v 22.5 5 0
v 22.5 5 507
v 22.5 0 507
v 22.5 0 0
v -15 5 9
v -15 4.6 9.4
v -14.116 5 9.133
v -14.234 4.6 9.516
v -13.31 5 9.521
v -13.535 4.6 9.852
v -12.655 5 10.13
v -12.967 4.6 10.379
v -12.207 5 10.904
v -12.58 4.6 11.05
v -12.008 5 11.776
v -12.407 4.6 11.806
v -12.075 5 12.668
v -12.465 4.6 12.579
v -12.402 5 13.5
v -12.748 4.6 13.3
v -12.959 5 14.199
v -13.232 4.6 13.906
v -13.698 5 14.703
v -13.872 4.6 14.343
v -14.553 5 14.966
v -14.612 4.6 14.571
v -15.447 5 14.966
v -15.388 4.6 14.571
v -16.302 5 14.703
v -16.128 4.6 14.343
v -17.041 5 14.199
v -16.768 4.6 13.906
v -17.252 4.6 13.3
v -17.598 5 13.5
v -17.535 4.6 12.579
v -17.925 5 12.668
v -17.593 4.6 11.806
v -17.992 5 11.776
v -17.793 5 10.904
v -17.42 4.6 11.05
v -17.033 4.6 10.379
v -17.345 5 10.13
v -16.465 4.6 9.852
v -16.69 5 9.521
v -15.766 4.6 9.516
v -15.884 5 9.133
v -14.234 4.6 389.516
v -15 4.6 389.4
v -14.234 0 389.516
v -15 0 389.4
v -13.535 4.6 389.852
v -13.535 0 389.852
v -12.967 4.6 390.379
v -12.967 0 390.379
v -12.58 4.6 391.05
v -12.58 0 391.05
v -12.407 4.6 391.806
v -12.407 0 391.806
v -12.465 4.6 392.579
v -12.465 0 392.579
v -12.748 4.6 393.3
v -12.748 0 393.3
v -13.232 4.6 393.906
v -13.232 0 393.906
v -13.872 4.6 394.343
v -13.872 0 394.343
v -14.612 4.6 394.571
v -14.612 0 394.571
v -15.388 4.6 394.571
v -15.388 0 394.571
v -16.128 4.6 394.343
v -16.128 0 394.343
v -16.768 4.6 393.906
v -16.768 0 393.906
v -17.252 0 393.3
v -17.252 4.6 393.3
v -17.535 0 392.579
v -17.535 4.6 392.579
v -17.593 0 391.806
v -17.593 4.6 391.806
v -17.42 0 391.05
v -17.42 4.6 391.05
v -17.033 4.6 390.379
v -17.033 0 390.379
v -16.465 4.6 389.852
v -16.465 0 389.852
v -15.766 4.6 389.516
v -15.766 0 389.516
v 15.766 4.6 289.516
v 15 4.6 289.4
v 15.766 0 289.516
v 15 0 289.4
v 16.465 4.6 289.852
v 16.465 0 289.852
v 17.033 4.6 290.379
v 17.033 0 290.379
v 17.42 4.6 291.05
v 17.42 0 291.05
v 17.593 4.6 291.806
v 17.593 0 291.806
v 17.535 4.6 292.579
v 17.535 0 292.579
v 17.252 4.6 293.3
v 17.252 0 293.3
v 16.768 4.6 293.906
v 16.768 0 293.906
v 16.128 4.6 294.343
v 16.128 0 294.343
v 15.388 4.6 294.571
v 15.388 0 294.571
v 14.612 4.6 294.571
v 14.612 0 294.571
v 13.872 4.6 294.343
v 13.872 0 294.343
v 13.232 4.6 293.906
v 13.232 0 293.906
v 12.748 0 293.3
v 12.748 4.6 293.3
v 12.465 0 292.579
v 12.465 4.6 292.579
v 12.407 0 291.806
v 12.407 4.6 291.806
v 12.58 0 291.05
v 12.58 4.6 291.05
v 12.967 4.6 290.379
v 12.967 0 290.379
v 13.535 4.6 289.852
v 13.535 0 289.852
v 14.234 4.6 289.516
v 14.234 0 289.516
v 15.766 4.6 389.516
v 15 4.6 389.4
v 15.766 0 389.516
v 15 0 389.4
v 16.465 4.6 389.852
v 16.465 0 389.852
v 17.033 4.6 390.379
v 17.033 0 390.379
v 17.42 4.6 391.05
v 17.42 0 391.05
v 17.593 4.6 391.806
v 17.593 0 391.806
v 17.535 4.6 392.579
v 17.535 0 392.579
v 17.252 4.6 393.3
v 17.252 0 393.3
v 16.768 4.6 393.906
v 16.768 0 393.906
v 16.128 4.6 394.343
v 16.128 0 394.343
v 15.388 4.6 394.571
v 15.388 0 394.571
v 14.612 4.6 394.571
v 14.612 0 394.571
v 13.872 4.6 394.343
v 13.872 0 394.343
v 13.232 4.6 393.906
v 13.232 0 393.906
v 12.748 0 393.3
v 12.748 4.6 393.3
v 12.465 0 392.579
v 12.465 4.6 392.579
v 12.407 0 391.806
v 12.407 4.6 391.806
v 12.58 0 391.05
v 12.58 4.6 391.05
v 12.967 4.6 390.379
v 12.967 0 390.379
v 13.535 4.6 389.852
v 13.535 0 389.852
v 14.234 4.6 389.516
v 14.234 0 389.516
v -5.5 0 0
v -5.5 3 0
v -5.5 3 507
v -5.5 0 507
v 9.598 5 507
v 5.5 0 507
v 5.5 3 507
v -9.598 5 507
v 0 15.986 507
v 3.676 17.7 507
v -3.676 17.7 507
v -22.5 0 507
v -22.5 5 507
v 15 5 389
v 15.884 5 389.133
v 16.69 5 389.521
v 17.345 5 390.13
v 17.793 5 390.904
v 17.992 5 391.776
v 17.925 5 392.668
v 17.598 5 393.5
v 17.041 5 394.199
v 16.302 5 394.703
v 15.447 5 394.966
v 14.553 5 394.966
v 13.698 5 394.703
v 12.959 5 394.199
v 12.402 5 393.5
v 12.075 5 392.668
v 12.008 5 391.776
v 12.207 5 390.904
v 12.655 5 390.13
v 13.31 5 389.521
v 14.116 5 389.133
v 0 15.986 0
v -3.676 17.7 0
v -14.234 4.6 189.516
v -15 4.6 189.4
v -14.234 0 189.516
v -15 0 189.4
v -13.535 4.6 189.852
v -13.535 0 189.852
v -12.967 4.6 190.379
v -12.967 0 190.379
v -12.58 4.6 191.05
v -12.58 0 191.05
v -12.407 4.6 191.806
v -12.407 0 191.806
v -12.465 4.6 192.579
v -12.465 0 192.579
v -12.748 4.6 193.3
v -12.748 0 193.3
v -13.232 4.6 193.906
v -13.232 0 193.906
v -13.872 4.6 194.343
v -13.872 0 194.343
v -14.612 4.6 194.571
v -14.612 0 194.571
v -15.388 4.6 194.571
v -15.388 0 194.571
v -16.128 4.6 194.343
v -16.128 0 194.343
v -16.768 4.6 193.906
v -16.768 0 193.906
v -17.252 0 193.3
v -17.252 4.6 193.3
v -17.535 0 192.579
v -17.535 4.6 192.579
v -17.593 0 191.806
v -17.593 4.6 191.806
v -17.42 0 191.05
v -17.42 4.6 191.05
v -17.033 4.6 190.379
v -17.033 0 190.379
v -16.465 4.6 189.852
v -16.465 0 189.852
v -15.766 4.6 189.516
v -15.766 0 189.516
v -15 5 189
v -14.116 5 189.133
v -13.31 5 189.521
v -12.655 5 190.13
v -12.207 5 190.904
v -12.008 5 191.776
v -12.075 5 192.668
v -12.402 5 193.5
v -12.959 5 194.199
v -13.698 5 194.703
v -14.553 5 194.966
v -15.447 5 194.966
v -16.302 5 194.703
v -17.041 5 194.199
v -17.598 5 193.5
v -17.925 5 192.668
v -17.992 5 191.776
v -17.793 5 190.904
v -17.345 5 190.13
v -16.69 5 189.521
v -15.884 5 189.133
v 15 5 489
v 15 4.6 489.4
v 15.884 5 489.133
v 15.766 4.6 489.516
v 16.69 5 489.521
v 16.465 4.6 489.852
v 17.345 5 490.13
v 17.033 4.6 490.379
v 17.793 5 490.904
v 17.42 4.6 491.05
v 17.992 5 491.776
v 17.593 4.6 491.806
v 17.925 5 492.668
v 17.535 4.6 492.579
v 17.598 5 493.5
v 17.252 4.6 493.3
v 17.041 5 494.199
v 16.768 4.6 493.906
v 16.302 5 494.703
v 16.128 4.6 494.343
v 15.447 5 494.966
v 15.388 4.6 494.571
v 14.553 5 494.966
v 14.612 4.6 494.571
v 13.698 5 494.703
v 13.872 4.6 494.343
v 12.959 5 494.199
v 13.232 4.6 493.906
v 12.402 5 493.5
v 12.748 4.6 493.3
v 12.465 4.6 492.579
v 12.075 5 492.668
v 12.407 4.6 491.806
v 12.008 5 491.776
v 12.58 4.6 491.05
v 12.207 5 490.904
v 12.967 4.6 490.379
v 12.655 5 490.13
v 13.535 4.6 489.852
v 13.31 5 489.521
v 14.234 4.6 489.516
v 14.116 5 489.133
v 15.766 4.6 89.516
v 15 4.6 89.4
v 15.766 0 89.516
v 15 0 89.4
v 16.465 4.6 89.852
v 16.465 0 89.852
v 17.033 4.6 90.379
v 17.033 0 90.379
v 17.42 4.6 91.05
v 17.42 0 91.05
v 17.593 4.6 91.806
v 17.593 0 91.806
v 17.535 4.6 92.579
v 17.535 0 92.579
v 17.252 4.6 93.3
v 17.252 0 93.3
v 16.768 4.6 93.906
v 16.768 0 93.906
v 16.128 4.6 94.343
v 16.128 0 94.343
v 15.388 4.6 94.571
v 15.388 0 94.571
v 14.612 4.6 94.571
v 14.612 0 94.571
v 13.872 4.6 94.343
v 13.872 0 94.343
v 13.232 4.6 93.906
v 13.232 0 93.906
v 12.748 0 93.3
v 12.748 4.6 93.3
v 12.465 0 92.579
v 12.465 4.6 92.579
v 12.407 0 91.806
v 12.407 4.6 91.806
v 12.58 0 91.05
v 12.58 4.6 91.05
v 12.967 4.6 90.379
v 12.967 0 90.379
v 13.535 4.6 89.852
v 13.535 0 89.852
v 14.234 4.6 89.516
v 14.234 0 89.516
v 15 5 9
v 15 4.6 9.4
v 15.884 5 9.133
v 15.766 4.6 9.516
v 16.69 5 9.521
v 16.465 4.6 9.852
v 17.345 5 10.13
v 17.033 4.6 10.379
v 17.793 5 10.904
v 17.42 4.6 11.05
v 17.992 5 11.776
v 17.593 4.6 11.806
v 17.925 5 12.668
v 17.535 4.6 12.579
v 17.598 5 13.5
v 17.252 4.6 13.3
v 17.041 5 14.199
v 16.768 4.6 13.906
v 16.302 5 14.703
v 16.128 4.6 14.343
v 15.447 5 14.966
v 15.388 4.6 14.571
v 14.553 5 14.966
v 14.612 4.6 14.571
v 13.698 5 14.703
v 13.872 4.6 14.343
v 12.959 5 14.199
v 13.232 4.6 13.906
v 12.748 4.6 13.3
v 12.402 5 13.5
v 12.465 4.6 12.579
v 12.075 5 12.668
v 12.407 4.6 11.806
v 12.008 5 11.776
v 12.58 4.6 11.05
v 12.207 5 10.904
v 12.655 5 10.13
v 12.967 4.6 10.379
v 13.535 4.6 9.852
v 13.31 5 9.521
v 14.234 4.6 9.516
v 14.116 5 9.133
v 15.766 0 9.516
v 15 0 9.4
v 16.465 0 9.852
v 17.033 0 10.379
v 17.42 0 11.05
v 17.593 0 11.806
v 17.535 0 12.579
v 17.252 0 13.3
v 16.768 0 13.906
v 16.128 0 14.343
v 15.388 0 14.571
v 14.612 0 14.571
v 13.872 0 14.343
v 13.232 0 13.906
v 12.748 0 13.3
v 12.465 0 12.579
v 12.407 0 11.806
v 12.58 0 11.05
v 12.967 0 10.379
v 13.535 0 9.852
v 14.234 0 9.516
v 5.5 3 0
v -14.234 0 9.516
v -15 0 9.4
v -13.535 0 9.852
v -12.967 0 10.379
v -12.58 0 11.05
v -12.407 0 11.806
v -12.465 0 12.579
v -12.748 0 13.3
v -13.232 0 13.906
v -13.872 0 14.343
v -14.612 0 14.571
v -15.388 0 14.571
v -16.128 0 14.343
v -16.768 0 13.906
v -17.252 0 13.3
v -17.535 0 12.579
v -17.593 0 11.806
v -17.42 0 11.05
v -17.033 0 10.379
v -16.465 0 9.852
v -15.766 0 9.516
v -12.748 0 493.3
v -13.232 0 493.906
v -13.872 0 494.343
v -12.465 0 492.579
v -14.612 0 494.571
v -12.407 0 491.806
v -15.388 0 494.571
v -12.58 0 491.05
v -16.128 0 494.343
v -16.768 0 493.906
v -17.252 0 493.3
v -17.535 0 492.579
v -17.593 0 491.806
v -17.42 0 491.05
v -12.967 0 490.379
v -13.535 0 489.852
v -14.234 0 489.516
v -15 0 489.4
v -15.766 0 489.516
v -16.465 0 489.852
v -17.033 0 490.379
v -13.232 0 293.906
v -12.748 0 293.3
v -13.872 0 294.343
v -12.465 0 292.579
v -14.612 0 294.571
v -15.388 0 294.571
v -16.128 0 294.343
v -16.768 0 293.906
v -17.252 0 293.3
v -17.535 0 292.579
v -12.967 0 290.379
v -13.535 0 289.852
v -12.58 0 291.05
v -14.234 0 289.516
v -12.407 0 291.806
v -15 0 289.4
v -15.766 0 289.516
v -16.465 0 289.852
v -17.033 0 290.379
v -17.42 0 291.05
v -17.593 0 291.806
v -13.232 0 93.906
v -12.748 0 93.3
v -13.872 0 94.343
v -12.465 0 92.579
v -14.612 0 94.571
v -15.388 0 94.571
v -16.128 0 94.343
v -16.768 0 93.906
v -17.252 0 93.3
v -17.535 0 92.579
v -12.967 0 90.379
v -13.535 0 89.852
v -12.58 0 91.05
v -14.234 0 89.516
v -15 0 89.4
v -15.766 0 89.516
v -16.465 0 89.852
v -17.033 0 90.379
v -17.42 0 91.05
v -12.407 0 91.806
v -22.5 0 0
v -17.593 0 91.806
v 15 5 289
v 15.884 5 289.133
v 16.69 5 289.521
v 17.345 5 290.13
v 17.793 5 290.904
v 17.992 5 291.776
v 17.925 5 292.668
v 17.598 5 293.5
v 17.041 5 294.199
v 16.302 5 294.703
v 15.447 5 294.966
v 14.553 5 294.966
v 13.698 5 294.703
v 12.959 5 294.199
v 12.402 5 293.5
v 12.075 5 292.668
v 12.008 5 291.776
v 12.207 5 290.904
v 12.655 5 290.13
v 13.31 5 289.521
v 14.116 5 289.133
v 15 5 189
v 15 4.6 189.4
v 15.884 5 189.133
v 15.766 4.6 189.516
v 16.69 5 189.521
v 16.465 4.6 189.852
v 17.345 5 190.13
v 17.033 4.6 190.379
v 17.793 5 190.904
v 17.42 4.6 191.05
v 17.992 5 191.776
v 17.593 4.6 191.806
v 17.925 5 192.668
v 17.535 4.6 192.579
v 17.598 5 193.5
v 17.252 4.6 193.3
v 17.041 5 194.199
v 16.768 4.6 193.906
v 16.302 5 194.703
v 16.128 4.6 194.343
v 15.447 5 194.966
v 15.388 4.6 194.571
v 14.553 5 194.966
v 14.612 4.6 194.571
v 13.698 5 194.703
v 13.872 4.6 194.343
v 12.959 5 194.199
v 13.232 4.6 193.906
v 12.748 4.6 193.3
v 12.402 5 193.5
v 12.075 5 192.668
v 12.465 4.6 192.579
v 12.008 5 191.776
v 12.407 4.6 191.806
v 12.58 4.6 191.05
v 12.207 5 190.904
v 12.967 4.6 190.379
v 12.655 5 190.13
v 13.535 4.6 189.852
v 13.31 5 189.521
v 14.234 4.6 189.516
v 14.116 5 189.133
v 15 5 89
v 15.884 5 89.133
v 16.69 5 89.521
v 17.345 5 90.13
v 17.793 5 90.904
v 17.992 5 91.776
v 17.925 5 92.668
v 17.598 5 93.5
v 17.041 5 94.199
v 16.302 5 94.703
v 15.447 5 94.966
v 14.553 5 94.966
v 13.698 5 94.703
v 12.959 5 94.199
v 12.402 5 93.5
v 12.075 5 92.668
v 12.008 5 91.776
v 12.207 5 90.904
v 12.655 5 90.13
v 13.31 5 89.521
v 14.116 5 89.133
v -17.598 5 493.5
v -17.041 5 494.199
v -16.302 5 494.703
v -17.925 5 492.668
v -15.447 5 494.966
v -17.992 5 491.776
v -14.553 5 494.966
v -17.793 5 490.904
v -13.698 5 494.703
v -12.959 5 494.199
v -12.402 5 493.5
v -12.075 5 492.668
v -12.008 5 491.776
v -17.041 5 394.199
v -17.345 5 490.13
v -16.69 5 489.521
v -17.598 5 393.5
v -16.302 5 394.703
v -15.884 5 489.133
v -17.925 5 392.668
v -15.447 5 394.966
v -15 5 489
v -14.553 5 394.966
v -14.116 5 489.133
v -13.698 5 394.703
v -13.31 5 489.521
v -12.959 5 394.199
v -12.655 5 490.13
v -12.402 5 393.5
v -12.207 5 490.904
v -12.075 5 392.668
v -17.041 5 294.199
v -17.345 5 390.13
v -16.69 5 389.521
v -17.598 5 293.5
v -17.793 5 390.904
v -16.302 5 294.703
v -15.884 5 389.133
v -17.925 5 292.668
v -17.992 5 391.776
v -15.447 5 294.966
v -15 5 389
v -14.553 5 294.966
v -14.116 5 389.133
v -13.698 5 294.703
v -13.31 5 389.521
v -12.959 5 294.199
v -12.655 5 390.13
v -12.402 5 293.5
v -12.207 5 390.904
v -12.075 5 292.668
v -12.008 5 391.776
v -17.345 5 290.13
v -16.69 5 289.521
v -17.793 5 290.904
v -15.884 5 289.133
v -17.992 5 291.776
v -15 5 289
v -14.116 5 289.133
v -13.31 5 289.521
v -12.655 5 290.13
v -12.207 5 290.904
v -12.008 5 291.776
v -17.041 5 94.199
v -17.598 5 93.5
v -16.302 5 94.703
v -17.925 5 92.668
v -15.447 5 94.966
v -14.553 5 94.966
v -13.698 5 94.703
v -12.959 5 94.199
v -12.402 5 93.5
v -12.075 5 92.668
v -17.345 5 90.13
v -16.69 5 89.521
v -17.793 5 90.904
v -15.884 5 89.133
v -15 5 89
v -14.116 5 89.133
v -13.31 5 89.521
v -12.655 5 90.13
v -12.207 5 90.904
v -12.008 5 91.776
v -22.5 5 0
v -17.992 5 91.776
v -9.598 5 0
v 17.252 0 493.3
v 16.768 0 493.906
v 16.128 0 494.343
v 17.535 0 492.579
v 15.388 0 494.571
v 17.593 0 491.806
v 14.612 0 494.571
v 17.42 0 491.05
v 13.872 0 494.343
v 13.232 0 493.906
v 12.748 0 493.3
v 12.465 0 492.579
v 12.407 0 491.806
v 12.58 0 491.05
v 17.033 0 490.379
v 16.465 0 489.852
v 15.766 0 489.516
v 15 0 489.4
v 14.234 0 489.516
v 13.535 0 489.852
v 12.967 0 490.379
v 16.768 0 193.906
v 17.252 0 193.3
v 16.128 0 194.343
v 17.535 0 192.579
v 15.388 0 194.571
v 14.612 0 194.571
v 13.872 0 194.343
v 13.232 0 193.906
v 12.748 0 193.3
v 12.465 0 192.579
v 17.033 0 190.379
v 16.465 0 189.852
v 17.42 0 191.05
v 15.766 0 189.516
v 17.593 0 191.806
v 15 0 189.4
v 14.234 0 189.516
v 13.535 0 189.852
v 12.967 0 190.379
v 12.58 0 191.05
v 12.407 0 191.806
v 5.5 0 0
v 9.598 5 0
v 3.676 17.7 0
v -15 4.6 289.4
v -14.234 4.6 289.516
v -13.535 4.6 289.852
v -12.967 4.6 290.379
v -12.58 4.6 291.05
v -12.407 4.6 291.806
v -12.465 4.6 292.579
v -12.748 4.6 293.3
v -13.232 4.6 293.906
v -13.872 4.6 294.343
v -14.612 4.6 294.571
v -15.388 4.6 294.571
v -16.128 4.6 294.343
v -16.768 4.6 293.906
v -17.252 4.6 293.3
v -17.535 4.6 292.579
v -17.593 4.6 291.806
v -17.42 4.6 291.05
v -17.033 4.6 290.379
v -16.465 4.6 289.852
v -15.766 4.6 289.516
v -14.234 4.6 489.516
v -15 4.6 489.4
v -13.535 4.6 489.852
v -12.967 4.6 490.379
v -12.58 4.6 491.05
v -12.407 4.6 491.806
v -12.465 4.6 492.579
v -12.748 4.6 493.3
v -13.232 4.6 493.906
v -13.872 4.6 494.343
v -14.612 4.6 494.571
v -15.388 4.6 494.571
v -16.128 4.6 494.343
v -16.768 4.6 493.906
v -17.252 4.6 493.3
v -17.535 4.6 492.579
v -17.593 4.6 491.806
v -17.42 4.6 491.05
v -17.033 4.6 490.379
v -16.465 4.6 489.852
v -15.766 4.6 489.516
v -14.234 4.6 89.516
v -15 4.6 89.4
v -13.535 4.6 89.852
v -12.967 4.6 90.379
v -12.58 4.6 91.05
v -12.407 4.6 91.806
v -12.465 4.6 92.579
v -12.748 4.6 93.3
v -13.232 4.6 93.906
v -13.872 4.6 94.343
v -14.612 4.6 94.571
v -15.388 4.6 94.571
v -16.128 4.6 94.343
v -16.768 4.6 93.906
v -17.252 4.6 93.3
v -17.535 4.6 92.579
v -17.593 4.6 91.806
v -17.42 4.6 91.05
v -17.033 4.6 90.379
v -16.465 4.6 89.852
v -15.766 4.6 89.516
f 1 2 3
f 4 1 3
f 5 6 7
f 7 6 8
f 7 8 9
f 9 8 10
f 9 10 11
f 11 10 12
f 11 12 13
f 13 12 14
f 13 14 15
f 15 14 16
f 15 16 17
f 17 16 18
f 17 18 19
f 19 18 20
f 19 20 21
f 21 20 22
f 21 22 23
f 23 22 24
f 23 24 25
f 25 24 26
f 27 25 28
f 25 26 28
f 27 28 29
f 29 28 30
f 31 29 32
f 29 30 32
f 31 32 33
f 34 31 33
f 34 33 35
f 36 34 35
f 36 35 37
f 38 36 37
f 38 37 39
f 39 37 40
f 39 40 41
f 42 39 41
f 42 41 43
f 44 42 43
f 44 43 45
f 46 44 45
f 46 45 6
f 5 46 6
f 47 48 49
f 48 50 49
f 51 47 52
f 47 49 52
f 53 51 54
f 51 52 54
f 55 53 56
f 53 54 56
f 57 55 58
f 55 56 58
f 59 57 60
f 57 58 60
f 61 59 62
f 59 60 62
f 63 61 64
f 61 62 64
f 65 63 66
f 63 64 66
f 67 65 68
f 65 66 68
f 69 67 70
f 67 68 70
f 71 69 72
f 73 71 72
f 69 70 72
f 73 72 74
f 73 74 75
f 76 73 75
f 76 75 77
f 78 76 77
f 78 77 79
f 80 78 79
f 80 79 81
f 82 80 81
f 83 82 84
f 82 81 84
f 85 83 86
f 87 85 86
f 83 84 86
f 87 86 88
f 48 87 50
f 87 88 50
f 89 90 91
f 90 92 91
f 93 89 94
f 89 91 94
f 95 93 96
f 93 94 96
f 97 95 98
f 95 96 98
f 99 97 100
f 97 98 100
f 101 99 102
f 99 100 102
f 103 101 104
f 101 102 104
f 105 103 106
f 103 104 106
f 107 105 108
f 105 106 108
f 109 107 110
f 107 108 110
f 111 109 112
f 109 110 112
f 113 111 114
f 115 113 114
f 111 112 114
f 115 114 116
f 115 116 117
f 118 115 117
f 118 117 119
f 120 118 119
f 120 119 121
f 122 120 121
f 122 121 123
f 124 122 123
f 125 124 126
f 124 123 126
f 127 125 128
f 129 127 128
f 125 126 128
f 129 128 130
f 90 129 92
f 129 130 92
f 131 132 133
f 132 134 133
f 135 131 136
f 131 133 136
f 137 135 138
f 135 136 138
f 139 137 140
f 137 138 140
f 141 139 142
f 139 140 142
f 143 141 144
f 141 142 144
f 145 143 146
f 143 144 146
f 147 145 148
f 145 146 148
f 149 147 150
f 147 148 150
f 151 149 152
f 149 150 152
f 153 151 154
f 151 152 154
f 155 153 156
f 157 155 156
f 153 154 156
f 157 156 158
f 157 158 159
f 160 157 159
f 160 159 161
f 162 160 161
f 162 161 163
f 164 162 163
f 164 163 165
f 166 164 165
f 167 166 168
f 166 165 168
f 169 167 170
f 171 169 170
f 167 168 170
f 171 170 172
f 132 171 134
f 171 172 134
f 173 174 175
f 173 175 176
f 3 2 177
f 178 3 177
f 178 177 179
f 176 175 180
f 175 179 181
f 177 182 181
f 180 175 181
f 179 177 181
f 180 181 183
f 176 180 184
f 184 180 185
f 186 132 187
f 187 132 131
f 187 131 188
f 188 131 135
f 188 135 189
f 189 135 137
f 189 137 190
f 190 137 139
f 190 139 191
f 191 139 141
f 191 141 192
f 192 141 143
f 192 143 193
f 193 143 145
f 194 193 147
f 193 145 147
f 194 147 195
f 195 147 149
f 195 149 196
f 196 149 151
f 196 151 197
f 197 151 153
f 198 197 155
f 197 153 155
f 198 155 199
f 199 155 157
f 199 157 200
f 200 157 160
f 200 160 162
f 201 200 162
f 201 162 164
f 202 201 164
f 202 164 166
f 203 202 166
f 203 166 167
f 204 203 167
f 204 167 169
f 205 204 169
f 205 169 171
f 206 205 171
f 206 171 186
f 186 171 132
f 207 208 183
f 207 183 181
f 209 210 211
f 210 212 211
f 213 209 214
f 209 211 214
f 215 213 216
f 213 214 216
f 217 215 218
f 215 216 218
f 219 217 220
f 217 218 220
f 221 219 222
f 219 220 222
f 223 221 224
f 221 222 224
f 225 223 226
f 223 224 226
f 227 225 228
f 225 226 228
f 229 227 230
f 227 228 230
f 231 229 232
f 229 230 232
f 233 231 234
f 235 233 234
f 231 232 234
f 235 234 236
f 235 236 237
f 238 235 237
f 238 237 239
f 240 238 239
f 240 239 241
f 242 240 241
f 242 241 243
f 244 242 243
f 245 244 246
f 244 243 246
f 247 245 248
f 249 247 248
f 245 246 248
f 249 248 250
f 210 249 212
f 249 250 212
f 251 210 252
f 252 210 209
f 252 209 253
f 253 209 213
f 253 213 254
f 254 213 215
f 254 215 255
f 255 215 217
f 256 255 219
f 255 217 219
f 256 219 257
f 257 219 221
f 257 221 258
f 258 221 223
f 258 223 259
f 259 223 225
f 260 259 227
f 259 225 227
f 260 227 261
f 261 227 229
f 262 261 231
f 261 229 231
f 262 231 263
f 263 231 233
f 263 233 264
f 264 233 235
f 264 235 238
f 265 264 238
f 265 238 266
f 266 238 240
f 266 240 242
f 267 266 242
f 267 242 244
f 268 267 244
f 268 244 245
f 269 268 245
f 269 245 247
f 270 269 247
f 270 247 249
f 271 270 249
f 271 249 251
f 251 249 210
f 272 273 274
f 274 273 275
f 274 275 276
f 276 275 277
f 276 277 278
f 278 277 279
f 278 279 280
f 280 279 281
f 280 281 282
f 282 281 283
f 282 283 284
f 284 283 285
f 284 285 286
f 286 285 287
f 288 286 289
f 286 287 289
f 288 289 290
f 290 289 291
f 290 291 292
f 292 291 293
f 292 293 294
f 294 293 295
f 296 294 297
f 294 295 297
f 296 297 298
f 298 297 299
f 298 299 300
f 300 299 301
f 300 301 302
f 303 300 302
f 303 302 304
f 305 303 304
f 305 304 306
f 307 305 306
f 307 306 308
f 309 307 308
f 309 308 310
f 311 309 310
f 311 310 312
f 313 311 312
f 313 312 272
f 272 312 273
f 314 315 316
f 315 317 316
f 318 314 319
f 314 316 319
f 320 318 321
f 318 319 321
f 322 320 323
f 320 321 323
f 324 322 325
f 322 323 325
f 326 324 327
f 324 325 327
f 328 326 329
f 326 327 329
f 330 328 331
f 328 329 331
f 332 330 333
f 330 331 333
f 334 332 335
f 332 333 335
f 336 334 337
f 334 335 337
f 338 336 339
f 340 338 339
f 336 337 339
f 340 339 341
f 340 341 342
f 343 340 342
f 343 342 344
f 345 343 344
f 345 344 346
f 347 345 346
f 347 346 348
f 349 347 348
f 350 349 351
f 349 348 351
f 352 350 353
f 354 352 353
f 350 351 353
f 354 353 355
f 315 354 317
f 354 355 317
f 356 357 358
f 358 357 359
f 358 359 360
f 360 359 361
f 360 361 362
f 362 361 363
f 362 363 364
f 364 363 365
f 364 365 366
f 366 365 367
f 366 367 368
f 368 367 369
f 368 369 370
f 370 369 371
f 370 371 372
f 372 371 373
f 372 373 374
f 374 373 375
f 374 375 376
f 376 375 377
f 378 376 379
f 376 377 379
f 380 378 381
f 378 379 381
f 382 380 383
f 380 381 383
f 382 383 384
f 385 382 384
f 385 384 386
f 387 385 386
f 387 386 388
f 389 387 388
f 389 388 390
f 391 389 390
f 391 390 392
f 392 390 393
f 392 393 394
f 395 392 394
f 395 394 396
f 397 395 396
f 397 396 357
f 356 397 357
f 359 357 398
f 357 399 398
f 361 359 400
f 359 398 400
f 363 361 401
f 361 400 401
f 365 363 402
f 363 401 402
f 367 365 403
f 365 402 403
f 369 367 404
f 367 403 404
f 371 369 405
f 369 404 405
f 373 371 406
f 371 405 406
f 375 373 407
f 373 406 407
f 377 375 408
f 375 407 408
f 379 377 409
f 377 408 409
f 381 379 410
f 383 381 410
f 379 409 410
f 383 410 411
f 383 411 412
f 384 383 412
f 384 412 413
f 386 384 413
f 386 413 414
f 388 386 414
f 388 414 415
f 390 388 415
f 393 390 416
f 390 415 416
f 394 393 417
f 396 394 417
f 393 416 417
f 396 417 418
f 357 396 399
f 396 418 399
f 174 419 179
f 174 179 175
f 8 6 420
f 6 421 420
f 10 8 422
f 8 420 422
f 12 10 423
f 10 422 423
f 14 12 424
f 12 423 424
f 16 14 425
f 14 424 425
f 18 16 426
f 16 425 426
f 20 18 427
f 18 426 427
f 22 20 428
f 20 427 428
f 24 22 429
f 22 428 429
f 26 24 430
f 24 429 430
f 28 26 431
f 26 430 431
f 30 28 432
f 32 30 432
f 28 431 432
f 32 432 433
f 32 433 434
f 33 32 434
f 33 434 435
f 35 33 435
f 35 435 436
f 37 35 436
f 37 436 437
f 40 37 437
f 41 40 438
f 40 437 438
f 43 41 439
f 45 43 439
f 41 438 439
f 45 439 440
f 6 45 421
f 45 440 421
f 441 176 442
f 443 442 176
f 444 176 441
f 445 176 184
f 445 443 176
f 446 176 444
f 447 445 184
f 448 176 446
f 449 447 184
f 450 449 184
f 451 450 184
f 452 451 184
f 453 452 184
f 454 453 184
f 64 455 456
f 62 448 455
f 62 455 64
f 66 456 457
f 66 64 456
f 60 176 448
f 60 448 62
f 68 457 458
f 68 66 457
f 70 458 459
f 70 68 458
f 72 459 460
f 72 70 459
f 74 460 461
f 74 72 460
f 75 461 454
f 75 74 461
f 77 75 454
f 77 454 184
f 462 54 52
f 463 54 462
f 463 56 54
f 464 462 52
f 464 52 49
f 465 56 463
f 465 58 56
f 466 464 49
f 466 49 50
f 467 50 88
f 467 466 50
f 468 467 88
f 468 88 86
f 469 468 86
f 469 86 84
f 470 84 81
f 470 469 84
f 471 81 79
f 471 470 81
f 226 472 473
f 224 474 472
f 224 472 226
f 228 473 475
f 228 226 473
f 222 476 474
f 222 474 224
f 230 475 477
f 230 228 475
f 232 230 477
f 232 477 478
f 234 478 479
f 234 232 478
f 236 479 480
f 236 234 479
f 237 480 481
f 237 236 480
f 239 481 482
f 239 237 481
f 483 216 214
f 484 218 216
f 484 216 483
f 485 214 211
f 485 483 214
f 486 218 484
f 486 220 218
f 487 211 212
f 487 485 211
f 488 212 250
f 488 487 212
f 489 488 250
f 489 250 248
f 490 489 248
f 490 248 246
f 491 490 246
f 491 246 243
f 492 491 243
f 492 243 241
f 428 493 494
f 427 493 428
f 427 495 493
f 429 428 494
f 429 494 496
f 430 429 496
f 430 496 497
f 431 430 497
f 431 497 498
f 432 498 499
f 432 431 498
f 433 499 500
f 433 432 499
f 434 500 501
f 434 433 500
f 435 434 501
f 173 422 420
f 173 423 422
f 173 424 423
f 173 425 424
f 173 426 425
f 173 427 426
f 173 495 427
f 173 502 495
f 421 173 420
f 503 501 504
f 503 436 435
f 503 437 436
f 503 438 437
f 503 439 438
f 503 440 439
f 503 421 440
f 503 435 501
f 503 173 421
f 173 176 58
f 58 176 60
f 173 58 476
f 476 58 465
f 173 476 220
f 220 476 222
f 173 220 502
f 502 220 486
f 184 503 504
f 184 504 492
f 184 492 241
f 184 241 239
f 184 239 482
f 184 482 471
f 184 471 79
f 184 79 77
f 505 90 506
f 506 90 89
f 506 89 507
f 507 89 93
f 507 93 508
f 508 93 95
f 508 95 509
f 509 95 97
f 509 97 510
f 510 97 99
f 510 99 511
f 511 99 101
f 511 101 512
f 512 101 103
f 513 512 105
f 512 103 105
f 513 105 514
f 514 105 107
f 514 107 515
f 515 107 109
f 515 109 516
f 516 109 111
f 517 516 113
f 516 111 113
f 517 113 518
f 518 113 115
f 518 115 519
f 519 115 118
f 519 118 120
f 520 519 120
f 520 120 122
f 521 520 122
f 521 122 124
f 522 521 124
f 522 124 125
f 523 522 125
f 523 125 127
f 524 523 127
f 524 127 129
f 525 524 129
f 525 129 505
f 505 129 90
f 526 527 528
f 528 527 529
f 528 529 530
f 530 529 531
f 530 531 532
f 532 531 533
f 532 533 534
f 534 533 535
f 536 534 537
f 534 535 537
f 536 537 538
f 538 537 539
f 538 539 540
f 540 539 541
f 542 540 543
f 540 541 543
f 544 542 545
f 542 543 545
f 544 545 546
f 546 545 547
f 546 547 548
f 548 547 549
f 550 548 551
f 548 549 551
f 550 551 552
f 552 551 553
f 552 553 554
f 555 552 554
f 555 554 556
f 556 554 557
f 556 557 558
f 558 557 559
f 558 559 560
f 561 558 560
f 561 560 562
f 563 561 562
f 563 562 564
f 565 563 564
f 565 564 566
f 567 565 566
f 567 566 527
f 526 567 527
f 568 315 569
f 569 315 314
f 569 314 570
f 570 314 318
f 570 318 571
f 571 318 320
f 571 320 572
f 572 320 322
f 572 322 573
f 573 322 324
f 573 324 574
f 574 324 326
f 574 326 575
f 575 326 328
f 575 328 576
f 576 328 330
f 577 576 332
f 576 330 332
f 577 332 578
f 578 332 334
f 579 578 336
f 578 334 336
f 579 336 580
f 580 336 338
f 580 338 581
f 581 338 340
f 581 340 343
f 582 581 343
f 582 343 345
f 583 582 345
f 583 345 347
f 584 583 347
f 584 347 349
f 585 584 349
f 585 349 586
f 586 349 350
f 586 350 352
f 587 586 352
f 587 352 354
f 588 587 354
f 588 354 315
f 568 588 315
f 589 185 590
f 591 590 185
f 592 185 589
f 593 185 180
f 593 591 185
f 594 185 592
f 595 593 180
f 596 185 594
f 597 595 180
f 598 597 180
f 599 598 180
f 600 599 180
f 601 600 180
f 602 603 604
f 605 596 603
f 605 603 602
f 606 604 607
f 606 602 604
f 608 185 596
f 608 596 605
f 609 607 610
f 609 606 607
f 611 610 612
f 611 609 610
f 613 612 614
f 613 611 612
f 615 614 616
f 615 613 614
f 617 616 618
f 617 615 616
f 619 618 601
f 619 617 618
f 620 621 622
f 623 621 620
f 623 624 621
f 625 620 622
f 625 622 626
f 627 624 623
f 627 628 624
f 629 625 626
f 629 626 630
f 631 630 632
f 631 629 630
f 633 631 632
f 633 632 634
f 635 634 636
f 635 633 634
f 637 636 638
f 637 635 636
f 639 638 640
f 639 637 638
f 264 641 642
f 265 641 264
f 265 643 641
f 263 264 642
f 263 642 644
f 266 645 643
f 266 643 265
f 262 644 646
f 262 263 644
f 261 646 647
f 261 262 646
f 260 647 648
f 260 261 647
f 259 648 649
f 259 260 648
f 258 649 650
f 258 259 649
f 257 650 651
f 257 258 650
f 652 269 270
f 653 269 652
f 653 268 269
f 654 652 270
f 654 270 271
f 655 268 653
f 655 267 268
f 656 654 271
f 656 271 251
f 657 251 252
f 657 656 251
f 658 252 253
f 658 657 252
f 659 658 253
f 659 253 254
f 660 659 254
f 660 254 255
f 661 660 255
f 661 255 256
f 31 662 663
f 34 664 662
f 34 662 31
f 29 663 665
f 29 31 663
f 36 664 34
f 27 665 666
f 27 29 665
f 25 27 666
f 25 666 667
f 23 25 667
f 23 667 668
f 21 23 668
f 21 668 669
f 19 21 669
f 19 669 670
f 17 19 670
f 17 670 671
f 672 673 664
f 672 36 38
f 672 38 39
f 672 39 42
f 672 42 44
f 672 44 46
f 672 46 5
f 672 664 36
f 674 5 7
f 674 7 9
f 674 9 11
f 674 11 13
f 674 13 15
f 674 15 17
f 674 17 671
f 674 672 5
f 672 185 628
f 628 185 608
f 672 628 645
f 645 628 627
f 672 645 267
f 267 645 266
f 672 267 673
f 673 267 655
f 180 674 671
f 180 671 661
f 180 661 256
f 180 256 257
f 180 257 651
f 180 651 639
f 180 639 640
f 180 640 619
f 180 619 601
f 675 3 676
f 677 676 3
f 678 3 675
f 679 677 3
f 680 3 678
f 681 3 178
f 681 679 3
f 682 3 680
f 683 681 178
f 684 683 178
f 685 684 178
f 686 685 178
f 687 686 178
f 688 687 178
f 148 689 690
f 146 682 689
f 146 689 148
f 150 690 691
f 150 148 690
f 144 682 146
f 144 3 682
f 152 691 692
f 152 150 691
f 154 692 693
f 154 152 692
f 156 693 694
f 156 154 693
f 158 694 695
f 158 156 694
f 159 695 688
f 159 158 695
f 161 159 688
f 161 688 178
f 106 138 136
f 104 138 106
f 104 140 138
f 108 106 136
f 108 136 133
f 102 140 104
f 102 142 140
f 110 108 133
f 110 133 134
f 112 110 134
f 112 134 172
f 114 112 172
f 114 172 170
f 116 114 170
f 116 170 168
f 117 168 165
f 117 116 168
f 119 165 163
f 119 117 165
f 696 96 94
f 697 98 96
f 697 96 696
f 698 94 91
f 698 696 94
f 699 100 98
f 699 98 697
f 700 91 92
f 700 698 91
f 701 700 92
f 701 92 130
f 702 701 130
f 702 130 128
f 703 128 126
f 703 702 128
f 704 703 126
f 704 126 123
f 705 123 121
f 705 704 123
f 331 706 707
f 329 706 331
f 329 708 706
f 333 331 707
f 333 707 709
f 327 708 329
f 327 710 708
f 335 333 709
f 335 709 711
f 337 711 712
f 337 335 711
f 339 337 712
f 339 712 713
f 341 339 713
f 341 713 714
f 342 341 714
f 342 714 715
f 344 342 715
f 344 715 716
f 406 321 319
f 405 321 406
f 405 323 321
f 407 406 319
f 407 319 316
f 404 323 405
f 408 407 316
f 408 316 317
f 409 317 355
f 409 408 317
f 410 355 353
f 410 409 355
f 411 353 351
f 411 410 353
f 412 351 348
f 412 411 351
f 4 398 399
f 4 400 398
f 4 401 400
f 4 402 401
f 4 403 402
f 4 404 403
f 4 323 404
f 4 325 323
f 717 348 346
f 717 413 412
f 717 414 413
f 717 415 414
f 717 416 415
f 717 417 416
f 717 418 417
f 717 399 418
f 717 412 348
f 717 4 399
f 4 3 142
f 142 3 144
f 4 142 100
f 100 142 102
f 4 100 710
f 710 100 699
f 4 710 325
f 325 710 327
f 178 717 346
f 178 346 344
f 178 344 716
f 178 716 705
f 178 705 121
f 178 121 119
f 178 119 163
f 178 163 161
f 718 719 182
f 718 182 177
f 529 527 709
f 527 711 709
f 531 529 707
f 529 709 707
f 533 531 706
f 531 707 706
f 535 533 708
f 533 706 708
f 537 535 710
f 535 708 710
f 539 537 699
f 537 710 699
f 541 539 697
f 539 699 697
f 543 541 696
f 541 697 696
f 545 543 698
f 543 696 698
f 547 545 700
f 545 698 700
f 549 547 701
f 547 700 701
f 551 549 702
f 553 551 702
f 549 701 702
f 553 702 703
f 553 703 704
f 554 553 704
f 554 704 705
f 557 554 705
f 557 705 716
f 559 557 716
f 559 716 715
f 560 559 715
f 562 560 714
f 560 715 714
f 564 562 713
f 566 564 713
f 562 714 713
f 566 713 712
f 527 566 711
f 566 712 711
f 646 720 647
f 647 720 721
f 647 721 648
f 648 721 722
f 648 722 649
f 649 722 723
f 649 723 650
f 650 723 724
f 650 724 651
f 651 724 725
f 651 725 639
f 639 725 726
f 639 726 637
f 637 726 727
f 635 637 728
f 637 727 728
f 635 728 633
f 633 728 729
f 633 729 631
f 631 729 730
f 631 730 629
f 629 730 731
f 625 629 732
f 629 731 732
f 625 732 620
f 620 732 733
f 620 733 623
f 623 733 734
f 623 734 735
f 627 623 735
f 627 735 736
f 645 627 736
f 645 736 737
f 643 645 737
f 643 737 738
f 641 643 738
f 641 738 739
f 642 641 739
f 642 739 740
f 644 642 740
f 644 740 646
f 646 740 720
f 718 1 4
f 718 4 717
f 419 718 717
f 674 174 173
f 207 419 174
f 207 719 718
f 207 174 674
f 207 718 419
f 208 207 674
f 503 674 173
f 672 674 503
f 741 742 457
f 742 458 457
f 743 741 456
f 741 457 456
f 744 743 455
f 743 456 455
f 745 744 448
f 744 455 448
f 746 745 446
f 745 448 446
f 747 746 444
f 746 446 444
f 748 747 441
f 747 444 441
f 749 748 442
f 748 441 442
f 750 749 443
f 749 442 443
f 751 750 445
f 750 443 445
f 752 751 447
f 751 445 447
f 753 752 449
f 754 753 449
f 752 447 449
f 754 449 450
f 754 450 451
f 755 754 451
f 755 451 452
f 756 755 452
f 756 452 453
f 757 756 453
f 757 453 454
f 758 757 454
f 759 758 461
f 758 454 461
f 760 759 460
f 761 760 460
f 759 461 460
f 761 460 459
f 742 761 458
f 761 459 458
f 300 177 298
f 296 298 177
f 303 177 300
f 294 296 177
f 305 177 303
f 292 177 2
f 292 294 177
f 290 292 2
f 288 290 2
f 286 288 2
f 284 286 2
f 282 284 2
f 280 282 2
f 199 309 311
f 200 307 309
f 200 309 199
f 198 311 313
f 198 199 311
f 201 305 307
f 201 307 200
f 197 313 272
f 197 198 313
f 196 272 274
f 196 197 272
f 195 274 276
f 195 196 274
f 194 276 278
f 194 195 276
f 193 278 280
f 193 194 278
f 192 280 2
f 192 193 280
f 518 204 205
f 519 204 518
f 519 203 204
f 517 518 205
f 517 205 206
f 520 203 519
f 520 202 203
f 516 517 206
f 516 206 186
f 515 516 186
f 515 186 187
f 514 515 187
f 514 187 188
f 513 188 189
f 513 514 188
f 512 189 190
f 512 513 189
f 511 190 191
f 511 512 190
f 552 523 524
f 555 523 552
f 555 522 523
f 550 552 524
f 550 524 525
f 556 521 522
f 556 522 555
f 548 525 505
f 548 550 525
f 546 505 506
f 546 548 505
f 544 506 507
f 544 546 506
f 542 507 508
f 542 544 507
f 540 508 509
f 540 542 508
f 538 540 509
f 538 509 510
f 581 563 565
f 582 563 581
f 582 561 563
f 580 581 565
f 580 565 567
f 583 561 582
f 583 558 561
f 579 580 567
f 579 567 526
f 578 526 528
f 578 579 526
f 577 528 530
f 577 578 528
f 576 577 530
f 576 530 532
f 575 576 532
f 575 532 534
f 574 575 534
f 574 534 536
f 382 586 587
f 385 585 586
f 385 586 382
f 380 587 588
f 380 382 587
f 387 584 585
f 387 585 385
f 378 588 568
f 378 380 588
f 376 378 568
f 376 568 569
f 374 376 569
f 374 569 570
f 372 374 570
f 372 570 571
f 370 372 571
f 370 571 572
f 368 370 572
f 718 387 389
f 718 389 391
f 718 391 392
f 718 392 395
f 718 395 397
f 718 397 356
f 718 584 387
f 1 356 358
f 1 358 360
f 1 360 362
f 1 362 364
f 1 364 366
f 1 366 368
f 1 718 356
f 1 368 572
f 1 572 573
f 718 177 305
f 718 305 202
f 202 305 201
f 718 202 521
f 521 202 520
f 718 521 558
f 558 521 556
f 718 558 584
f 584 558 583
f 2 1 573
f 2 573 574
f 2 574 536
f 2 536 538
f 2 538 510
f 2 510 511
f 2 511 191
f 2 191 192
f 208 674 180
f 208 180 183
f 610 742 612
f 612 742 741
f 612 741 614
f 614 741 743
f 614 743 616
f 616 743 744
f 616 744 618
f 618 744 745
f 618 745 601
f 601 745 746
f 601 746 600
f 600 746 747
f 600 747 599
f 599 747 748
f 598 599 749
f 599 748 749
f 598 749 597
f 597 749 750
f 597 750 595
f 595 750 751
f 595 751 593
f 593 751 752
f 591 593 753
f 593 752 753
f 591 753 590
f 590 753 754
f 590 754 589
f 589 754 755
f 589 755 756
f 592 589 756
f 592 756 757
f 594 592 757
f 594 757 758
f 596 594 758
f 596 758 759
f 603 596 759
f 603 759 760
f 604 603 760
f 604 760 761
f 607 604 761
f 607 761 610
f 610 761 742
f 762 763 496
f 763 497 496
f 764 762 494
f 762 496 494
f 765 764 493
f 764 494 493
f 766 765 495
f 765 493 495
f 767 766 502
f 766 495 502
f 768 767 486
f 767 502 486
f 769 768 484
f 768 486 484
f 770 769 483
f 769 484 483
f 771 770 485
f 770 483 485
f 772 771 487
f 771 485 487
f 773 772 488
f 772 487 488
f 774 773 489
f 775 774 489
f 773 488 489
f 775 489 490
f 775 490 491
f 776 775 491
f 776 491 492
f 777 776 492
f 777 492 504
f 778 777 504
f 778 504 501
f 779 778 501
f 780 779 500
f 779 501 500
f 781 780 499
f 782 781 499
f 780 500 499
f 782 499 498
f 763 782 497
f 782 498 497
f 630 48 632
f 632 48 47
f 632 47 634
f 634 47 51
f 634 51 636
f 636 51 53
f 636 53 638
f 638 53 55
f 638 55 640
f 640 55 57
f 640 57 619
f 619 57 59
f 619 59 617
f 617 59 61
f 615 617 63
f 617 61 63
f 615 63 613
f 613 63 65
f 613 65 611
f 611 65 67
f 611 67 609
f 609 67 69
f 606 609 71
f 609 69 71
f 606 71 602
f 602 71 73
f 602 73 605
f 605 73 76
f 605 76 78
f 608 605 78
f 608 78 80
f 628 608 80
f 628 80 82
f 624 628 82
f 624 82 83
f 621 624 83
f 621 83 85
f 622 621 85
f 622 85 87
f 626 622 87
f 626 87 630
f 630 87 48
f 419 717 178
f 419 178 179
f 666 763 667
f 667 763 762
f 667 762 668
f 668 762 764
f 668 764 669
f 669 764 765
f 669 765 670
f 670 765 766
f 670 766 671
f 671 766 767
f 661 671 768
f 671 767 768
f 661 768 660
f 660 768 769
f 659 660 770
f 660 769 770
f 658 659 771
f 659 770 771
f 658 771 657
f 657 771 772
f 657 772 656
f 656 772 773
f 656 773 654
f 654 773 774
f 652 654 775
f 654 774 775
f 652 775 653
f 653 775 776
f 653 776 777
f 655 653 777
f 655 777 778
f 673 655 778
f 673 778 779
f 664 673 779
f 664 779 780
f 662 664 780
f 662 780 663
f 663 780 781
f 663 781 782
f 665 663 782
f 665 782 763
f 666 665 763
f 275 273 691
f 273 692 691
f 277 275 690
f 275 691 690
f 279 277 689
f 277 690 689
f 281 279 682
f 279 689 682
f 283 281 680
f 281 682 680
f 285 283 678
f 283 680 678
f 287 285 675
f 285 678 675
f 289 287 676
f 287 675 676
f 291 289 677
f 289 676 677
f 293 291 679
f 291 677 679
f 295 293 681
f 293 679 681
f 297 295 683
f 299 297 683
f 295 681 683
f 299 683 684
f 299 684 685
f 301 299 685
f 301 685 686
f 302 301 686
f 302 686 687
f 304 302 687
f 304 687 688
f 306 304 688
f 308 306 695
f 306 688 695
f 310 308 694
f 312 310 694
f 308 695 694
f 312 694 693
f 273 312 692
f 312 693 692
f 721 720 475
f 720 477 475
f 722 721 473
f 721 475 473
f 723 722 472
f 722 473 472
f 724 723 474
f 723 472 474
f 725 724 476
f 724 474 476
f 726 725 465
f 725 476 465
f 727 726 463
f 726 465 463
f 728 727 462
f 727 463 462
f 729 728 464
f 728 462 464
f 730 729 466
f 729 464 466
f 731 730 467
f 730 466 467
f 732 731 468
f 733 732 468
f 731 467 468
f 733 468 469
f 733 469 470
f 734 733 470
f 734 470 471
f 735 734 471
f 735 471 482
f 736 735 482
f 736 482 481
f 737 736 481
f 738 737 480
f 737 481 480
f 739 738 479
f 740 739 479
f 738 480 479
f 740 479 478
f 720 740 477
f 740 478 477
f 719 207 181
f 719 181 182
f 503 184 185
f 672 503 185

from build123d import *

# Parameters (mm, degrees)
BOSS_EXTRUDE1_DEPTH               = 507
TAP_DRILL_FOR_M5_TAP1_D           = 5.2
TAP_DRILL_FOR_M5_TAP1_DEPTH       = 46
TAP_DRILL_FOR_M5_TAP1_CSINK_D     = 6
TAP_DRILL_FOR_M5_TAP1_CSINK_ANGLE = 90
TAP_DRILL_FOR_M5_TAP1_TIP         = 1.562237609


with BuildPart() as part:
    # Sketch1 → Boss-Extrude1 (new body)
    with BuildSketch(Plane.XY):
        Polygon((5.5, 3), (-5.5, 3), (-5.5, 0), (-22.5, 0), (-22.5, 5), (-9.597702448, 5), (-3.67559519, 17.7), (0, 15.986041815), (3.67559519, 17.7), (9.597702448, 5), (22.5, 5), (22.5, 0), (5.5, 0), align=None)
    extrude(amount=BOSS_EXTRUDE1_DEPTH)

    # Tap Drill for M5 Tap1
    with Locations(Plane(origin=(-15, 5, 12), x_dir=(0, 0, 1), z_dir=(0, 1, 0))):
        with Locations((0, 0), (0, 30), (80, 0), (80, 30), (180, 0), (180, 30), (280, 0), (280, 30), (380, 0), (380, 30), (480, 0), (480, 30)):
            CounterSinkHole(TAP_DRILL_FOR_M5_TAP1_D / 2, TAP_DRILL_FOR_M5_TAP1_CSINK_D / 2, depth=TAP_DRILL_FOR_M5_TAP1_DEPTH, counter_sink_angle=TAP_DRILL_FOR_M5_TAP1_CSINK_ANGLE)
            with Locations((0, 0, -(TAP_DRILL_FOR_M5_TAP1_DEPTH + TAP_DRILL_FOR_M5_TAP1_TIP / 2))):  # 118° drill point
                Cone(0, TAP_DRILL_FOR_M5_TAP1_D / 2, TAP_DRILL_FOR_M5_TAP1_TIP, mode=Mode.SUBTRACT)


solid = part.part
